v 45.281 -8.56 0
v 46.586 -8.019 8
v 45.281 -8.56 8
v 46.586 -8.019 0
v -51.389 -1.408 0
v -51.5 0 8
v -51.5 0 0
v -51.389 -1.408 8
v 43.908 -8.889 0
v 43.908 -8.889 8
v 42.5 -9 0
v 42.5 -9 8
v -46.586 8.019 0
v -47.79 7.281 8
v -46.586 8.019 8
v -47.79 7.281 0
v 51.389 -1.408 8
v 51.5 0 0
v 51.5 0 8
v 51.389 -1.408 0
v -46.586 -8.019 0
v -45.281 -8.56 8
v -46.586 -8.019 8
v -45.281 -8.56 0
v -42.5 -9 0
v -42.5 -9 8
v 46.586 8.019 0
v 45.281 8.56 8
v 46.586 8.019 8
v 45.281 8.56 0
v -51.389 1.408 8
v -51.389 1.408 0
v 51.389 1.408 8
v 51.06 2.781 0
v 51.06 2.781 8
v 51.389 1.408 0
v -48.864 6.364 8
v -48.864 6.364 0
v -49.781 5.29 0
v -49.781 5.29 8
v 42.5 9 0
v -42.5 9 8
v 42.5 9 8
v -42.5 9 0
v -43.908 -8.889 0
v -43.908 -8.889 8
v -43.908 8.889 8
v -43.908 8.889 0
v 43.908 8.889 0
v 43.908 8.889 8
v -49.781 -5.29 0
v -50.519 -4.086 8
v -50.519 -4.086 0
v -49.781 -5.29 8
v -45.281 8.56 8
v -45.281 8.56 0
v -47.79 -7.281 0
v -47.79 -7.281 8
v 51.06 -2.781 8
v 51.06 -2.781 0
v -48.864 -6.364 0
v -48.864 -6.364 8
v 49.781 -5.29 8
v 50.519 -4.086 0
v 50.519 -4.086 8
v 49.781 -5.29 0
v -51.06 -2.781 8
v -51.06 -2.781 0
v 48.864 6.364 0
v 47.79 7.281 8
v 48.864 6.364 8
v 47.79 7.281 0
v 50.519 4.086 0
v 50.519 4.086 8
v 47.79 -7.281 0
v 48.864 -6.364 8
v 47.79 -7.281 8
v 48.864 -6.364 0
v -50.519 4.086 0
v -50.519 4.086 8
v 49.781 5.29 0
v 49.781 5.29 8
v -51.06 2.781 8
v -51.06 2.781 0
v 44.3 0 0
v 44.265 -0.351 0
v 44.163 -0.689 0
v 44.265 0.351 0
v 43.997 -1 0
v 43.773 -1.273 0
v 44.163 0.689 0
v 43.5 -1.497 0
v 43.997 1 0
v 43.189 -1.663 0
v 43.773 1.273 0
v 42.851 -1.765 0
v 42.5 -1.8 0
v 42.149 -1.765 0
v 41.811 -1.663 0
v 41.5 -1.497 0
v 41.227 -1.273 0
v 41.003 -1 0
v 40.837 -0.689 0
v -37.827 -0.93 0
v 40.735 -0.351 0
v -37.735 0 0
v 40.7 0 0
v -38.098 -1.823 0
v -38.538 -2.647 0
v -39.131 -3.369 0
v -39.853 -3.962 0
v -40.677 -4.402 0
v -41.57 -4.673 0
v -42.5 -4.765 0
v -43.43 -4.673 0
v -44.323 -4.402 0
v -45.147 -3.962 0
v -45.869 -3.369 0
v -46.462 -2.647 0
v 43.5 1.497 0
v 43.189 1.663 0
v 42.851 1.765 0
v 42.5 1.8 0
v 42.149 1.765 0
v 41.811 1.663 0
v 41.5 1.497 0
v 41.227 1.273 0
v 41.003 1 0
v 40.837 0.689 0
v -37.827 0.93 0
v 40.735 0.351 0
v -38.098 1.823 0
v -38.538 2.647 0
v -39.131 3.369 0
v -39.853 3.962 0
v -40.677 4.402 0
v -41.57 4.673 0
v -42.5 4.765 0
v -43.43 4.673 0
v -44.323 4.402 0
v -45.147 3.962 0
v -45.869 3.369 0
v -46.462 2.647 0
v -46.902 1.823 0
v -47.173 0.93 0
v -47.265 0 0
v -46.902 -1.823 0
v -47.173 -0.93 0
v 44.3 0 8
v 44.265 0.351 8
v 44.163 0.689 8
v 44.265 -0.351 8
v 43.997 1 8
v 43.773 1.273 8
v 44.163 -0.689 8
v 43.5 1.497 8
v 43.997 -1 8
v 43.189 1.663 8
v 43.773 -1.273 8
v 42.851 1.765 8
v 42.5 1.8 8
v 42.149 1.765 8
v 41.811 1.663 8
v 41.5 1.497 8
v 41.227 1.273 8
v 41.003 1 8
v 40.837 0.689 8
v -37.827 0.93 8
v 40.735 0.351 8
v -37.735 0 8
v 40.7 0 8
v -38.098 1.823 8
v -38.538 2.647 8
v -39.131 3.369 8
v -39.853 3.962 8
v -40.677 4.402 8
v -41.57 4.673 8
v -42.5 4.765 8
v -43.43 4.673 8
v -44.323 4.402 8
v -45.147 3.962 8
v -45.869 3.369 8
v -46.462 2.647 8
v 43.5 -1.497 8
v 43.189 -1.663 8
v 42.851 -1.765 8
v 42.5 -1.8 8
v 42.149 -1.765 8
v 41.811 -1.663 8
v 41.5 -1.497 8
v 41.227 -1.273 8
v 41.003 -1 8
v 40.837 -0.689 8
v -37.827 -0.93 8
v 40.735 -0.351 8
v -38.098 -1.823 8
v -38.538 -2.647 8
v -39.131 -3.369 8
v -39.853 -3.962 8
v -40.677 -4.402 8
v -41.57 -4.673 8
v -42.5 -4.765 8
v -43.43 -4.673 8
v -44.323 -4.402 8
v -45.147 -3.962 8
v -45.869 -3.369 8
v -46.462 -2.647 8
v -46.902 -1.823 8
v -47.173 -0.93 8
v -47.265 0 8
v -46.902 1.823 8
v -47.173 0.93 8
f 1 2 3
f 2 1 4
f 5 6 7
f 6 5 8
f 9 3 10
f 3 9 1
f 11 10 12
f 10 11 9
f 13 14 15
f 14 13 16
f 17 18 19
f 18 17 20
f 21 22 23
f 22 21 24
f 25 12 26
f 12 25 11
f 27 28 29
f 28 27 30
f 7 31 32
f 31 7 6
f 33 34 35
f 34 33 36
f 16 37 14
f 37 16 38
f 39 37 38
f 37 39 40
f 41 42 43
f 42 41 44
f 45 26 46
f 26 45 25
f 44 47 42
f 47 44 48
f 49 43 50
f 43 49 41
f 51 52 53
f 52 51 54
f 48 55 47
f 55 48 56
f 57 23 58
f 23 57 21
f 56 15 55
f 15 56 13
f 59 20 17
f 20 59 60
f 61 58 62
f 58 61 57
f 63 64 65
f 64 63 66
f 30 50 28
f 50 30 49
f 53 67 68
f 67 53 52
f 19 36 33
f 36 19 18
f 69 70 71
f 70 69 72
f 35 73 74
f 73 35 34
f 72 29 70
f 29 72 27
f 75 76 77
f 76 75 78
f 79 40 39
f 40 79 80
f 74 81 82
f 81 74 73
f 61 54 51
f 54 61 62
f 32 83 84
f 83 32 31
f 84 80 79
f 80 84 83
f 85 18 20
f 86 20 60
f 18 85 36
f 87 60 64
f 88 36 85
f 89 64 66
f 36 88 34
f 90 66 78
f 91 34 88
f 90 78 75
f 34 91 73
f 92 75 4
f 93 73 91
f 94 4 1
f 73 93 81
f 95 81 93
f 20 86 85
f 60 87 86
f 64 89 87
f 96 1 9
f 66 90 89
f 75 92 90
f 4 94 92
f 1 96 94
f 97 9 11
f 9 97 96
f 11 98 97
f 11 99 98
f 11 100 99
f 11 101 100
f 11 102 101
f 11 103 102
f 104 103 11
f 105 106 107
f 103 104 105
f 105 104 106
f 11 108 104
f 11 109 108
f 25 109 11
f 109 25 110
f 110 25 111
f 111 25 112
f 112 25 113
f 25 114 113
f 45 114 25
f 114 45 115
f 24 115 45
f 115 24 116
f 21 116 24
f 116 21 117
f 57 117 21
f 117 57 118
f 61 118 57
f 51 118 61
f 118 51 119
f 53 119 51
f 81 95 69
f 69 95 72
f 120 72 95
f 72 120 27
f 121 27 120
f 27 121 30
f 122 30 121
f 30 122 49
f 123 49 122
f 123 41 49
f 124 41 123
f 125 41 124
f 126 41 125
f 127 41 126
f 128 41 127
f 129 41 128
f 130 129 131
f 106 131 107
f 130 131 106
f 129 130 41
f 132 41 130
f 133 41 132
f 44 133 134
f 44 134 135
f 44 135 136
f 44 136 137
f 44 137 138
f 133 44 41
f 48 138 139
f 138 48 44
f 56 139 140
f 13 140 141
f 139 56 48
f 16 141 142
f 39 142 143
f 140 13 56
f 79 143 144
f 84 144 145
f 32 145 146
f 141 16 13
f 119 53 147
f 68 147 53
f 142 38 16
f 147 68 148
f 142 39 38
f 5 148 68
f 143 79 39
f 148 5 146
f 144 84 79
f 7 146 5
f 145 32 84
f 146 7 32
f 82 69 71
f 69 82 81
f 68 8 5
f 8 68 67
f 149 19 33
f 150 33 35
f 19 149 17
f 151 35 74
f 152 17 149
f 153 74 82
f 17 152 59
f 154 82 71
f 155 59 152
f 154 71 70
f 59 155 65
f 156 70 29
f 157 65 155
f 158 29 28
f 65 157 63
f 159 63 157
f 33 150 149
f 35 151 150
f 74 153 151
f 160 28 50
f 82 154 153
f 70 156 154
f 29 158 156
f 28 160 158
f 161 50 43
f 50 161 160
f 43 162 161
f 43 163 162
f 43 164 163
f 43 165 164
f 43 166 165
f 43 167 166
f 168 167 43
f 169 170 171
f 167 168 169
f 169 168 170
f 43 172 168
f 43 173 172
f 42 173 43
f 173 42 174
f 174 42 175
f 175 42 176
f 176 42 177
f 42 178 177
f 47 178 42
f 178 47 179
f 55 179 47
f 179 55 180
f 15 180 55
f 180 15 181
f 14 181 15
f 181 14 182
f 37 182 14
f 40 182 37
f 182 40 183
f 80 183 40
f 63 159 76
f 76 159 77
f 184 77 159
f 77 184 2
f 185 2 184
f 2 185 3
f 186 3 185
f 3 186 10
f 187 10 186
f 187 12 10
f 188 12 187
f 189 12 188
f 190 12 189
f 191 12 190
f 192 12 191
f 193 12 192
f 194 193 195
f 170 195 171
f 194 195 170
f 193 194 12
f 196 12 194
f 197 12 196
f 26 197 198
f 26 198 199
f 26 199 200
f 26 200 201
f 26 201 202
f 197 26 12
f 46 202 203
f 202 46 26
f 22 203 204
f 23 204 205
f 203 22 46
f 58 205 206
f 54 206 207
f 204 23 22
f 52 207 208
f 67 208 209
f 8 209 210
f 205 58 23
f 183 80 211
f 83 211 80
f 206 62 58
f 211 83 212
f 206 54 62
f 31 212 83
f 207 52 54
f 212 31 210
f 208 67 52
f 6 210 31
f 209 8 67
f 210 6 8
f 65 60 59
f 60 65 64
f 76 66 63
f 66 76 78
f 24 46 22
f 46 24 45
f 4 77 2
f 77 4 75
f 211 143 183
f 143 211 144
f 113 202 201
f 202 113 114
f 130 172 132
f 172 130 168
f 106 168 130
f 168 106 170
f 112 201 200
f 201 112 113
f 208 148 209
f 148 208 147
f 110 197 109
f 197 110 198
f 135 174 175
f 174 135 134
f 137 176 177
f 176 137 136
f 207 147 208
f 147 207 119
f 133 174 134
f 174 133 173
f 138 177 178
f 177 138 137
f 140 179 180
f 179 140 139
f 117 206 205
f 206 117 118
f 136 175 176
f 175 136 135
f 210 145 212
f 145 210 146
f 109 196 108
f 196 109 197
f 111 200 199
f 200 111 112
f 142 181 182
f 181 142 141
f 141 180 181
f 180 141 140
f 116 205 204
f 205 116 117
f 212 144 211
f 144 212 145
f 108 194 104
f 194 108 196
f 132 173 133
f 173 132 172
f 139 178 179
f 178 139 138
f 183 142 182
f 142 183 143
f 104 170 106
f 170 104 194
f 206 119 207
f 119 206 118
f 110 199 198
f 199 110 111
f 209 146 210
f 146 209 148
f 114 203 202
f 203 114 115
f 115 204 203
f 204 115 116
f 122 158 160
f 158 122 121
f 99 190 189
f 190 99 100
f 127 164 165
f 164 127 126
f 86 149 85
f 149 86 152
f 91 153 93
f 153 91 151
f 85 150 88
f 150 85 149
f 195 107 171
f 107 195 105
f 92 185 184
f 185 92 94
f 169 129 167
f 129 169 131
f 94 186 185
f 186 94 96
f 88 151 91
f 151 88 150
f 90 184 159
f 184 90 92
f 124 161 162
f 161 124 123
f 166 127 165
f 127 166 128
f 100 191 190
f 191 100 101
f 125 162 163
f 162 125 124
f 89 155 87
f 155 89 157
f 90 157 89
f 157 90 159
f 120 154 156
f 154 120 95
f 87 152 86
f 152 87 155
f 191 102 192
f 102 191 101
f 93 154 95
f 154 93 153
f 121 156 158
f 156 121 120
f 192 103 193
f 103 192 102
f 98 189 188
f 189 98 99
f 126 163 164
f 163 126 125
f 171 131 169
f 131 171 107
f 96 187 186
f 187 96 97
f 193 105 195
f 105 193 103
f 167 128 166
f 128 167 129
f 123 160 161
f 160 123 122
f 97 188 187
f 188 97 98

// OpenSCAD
$fn = 32;

// ----------------------------------------------------------------------
// Lever: 85 mm between the bosses, 8 mm thick, smooth outline
// ----------------------------------------------------------------------

// --- parameters (mm) ---
lever_l = 85;             // distance between the boss centres
boss_a = 18;              // first boss diameter
boss_b = 18;              // second boss diameter
bore_a = 9.53;            // first bore
bore_b = 3.6;             // second bore
lever_t = 8;              // lever thickness

lever_profile = [[-51.5, 0], [-51.389, -1.408], [-51.06, -2.781], [-50.519, -4.086], [-49.781, -5.29], [-48.864, -6.364], [-47.79, -7.281], [-46.586, -8.019], [-45.281, -8.56], [-43.908, -8.889], [-42.5, -9], [42.5, -9], [43.908, -8.889], [45.281, -8.56], [46.586, -8.019], [47.79, -7.281], [48.864, -6.364], [49.781, -5.29], [50.519, -4.086], [51.06, -2.781], [51.389, -1.408], [51.5, 0], [51.389, 1.408], [51.06, 2.781], [50.519, 4.086], [49.781, 5.29], [48.864, 6.364], [47.79, 7.281], [46.586, 8.019], [45.281, 8.56], [43.908, 8.889], [42.5, 9], [-42.5, 9], [-43.908, 8.889], [-45.281, 8.56], [-46.586, 8.019], [-47.79, 7.281], [-48.864, 6.364], [-49.781, 5.29], [-50.519, 4.086], [-51.06, 2.781], [-51.389, 1.408]];

difference() {
  linear_extrude(height = lever_t) polygon(lever_profile);
  translate([-42.5, 0, -2.5]) cylinder(h = lever_t + 5, d = bore_a);
  translate([42.5, 0, -2.5]) cylinder(h = lever_t + 5, d = bore_b);
}
